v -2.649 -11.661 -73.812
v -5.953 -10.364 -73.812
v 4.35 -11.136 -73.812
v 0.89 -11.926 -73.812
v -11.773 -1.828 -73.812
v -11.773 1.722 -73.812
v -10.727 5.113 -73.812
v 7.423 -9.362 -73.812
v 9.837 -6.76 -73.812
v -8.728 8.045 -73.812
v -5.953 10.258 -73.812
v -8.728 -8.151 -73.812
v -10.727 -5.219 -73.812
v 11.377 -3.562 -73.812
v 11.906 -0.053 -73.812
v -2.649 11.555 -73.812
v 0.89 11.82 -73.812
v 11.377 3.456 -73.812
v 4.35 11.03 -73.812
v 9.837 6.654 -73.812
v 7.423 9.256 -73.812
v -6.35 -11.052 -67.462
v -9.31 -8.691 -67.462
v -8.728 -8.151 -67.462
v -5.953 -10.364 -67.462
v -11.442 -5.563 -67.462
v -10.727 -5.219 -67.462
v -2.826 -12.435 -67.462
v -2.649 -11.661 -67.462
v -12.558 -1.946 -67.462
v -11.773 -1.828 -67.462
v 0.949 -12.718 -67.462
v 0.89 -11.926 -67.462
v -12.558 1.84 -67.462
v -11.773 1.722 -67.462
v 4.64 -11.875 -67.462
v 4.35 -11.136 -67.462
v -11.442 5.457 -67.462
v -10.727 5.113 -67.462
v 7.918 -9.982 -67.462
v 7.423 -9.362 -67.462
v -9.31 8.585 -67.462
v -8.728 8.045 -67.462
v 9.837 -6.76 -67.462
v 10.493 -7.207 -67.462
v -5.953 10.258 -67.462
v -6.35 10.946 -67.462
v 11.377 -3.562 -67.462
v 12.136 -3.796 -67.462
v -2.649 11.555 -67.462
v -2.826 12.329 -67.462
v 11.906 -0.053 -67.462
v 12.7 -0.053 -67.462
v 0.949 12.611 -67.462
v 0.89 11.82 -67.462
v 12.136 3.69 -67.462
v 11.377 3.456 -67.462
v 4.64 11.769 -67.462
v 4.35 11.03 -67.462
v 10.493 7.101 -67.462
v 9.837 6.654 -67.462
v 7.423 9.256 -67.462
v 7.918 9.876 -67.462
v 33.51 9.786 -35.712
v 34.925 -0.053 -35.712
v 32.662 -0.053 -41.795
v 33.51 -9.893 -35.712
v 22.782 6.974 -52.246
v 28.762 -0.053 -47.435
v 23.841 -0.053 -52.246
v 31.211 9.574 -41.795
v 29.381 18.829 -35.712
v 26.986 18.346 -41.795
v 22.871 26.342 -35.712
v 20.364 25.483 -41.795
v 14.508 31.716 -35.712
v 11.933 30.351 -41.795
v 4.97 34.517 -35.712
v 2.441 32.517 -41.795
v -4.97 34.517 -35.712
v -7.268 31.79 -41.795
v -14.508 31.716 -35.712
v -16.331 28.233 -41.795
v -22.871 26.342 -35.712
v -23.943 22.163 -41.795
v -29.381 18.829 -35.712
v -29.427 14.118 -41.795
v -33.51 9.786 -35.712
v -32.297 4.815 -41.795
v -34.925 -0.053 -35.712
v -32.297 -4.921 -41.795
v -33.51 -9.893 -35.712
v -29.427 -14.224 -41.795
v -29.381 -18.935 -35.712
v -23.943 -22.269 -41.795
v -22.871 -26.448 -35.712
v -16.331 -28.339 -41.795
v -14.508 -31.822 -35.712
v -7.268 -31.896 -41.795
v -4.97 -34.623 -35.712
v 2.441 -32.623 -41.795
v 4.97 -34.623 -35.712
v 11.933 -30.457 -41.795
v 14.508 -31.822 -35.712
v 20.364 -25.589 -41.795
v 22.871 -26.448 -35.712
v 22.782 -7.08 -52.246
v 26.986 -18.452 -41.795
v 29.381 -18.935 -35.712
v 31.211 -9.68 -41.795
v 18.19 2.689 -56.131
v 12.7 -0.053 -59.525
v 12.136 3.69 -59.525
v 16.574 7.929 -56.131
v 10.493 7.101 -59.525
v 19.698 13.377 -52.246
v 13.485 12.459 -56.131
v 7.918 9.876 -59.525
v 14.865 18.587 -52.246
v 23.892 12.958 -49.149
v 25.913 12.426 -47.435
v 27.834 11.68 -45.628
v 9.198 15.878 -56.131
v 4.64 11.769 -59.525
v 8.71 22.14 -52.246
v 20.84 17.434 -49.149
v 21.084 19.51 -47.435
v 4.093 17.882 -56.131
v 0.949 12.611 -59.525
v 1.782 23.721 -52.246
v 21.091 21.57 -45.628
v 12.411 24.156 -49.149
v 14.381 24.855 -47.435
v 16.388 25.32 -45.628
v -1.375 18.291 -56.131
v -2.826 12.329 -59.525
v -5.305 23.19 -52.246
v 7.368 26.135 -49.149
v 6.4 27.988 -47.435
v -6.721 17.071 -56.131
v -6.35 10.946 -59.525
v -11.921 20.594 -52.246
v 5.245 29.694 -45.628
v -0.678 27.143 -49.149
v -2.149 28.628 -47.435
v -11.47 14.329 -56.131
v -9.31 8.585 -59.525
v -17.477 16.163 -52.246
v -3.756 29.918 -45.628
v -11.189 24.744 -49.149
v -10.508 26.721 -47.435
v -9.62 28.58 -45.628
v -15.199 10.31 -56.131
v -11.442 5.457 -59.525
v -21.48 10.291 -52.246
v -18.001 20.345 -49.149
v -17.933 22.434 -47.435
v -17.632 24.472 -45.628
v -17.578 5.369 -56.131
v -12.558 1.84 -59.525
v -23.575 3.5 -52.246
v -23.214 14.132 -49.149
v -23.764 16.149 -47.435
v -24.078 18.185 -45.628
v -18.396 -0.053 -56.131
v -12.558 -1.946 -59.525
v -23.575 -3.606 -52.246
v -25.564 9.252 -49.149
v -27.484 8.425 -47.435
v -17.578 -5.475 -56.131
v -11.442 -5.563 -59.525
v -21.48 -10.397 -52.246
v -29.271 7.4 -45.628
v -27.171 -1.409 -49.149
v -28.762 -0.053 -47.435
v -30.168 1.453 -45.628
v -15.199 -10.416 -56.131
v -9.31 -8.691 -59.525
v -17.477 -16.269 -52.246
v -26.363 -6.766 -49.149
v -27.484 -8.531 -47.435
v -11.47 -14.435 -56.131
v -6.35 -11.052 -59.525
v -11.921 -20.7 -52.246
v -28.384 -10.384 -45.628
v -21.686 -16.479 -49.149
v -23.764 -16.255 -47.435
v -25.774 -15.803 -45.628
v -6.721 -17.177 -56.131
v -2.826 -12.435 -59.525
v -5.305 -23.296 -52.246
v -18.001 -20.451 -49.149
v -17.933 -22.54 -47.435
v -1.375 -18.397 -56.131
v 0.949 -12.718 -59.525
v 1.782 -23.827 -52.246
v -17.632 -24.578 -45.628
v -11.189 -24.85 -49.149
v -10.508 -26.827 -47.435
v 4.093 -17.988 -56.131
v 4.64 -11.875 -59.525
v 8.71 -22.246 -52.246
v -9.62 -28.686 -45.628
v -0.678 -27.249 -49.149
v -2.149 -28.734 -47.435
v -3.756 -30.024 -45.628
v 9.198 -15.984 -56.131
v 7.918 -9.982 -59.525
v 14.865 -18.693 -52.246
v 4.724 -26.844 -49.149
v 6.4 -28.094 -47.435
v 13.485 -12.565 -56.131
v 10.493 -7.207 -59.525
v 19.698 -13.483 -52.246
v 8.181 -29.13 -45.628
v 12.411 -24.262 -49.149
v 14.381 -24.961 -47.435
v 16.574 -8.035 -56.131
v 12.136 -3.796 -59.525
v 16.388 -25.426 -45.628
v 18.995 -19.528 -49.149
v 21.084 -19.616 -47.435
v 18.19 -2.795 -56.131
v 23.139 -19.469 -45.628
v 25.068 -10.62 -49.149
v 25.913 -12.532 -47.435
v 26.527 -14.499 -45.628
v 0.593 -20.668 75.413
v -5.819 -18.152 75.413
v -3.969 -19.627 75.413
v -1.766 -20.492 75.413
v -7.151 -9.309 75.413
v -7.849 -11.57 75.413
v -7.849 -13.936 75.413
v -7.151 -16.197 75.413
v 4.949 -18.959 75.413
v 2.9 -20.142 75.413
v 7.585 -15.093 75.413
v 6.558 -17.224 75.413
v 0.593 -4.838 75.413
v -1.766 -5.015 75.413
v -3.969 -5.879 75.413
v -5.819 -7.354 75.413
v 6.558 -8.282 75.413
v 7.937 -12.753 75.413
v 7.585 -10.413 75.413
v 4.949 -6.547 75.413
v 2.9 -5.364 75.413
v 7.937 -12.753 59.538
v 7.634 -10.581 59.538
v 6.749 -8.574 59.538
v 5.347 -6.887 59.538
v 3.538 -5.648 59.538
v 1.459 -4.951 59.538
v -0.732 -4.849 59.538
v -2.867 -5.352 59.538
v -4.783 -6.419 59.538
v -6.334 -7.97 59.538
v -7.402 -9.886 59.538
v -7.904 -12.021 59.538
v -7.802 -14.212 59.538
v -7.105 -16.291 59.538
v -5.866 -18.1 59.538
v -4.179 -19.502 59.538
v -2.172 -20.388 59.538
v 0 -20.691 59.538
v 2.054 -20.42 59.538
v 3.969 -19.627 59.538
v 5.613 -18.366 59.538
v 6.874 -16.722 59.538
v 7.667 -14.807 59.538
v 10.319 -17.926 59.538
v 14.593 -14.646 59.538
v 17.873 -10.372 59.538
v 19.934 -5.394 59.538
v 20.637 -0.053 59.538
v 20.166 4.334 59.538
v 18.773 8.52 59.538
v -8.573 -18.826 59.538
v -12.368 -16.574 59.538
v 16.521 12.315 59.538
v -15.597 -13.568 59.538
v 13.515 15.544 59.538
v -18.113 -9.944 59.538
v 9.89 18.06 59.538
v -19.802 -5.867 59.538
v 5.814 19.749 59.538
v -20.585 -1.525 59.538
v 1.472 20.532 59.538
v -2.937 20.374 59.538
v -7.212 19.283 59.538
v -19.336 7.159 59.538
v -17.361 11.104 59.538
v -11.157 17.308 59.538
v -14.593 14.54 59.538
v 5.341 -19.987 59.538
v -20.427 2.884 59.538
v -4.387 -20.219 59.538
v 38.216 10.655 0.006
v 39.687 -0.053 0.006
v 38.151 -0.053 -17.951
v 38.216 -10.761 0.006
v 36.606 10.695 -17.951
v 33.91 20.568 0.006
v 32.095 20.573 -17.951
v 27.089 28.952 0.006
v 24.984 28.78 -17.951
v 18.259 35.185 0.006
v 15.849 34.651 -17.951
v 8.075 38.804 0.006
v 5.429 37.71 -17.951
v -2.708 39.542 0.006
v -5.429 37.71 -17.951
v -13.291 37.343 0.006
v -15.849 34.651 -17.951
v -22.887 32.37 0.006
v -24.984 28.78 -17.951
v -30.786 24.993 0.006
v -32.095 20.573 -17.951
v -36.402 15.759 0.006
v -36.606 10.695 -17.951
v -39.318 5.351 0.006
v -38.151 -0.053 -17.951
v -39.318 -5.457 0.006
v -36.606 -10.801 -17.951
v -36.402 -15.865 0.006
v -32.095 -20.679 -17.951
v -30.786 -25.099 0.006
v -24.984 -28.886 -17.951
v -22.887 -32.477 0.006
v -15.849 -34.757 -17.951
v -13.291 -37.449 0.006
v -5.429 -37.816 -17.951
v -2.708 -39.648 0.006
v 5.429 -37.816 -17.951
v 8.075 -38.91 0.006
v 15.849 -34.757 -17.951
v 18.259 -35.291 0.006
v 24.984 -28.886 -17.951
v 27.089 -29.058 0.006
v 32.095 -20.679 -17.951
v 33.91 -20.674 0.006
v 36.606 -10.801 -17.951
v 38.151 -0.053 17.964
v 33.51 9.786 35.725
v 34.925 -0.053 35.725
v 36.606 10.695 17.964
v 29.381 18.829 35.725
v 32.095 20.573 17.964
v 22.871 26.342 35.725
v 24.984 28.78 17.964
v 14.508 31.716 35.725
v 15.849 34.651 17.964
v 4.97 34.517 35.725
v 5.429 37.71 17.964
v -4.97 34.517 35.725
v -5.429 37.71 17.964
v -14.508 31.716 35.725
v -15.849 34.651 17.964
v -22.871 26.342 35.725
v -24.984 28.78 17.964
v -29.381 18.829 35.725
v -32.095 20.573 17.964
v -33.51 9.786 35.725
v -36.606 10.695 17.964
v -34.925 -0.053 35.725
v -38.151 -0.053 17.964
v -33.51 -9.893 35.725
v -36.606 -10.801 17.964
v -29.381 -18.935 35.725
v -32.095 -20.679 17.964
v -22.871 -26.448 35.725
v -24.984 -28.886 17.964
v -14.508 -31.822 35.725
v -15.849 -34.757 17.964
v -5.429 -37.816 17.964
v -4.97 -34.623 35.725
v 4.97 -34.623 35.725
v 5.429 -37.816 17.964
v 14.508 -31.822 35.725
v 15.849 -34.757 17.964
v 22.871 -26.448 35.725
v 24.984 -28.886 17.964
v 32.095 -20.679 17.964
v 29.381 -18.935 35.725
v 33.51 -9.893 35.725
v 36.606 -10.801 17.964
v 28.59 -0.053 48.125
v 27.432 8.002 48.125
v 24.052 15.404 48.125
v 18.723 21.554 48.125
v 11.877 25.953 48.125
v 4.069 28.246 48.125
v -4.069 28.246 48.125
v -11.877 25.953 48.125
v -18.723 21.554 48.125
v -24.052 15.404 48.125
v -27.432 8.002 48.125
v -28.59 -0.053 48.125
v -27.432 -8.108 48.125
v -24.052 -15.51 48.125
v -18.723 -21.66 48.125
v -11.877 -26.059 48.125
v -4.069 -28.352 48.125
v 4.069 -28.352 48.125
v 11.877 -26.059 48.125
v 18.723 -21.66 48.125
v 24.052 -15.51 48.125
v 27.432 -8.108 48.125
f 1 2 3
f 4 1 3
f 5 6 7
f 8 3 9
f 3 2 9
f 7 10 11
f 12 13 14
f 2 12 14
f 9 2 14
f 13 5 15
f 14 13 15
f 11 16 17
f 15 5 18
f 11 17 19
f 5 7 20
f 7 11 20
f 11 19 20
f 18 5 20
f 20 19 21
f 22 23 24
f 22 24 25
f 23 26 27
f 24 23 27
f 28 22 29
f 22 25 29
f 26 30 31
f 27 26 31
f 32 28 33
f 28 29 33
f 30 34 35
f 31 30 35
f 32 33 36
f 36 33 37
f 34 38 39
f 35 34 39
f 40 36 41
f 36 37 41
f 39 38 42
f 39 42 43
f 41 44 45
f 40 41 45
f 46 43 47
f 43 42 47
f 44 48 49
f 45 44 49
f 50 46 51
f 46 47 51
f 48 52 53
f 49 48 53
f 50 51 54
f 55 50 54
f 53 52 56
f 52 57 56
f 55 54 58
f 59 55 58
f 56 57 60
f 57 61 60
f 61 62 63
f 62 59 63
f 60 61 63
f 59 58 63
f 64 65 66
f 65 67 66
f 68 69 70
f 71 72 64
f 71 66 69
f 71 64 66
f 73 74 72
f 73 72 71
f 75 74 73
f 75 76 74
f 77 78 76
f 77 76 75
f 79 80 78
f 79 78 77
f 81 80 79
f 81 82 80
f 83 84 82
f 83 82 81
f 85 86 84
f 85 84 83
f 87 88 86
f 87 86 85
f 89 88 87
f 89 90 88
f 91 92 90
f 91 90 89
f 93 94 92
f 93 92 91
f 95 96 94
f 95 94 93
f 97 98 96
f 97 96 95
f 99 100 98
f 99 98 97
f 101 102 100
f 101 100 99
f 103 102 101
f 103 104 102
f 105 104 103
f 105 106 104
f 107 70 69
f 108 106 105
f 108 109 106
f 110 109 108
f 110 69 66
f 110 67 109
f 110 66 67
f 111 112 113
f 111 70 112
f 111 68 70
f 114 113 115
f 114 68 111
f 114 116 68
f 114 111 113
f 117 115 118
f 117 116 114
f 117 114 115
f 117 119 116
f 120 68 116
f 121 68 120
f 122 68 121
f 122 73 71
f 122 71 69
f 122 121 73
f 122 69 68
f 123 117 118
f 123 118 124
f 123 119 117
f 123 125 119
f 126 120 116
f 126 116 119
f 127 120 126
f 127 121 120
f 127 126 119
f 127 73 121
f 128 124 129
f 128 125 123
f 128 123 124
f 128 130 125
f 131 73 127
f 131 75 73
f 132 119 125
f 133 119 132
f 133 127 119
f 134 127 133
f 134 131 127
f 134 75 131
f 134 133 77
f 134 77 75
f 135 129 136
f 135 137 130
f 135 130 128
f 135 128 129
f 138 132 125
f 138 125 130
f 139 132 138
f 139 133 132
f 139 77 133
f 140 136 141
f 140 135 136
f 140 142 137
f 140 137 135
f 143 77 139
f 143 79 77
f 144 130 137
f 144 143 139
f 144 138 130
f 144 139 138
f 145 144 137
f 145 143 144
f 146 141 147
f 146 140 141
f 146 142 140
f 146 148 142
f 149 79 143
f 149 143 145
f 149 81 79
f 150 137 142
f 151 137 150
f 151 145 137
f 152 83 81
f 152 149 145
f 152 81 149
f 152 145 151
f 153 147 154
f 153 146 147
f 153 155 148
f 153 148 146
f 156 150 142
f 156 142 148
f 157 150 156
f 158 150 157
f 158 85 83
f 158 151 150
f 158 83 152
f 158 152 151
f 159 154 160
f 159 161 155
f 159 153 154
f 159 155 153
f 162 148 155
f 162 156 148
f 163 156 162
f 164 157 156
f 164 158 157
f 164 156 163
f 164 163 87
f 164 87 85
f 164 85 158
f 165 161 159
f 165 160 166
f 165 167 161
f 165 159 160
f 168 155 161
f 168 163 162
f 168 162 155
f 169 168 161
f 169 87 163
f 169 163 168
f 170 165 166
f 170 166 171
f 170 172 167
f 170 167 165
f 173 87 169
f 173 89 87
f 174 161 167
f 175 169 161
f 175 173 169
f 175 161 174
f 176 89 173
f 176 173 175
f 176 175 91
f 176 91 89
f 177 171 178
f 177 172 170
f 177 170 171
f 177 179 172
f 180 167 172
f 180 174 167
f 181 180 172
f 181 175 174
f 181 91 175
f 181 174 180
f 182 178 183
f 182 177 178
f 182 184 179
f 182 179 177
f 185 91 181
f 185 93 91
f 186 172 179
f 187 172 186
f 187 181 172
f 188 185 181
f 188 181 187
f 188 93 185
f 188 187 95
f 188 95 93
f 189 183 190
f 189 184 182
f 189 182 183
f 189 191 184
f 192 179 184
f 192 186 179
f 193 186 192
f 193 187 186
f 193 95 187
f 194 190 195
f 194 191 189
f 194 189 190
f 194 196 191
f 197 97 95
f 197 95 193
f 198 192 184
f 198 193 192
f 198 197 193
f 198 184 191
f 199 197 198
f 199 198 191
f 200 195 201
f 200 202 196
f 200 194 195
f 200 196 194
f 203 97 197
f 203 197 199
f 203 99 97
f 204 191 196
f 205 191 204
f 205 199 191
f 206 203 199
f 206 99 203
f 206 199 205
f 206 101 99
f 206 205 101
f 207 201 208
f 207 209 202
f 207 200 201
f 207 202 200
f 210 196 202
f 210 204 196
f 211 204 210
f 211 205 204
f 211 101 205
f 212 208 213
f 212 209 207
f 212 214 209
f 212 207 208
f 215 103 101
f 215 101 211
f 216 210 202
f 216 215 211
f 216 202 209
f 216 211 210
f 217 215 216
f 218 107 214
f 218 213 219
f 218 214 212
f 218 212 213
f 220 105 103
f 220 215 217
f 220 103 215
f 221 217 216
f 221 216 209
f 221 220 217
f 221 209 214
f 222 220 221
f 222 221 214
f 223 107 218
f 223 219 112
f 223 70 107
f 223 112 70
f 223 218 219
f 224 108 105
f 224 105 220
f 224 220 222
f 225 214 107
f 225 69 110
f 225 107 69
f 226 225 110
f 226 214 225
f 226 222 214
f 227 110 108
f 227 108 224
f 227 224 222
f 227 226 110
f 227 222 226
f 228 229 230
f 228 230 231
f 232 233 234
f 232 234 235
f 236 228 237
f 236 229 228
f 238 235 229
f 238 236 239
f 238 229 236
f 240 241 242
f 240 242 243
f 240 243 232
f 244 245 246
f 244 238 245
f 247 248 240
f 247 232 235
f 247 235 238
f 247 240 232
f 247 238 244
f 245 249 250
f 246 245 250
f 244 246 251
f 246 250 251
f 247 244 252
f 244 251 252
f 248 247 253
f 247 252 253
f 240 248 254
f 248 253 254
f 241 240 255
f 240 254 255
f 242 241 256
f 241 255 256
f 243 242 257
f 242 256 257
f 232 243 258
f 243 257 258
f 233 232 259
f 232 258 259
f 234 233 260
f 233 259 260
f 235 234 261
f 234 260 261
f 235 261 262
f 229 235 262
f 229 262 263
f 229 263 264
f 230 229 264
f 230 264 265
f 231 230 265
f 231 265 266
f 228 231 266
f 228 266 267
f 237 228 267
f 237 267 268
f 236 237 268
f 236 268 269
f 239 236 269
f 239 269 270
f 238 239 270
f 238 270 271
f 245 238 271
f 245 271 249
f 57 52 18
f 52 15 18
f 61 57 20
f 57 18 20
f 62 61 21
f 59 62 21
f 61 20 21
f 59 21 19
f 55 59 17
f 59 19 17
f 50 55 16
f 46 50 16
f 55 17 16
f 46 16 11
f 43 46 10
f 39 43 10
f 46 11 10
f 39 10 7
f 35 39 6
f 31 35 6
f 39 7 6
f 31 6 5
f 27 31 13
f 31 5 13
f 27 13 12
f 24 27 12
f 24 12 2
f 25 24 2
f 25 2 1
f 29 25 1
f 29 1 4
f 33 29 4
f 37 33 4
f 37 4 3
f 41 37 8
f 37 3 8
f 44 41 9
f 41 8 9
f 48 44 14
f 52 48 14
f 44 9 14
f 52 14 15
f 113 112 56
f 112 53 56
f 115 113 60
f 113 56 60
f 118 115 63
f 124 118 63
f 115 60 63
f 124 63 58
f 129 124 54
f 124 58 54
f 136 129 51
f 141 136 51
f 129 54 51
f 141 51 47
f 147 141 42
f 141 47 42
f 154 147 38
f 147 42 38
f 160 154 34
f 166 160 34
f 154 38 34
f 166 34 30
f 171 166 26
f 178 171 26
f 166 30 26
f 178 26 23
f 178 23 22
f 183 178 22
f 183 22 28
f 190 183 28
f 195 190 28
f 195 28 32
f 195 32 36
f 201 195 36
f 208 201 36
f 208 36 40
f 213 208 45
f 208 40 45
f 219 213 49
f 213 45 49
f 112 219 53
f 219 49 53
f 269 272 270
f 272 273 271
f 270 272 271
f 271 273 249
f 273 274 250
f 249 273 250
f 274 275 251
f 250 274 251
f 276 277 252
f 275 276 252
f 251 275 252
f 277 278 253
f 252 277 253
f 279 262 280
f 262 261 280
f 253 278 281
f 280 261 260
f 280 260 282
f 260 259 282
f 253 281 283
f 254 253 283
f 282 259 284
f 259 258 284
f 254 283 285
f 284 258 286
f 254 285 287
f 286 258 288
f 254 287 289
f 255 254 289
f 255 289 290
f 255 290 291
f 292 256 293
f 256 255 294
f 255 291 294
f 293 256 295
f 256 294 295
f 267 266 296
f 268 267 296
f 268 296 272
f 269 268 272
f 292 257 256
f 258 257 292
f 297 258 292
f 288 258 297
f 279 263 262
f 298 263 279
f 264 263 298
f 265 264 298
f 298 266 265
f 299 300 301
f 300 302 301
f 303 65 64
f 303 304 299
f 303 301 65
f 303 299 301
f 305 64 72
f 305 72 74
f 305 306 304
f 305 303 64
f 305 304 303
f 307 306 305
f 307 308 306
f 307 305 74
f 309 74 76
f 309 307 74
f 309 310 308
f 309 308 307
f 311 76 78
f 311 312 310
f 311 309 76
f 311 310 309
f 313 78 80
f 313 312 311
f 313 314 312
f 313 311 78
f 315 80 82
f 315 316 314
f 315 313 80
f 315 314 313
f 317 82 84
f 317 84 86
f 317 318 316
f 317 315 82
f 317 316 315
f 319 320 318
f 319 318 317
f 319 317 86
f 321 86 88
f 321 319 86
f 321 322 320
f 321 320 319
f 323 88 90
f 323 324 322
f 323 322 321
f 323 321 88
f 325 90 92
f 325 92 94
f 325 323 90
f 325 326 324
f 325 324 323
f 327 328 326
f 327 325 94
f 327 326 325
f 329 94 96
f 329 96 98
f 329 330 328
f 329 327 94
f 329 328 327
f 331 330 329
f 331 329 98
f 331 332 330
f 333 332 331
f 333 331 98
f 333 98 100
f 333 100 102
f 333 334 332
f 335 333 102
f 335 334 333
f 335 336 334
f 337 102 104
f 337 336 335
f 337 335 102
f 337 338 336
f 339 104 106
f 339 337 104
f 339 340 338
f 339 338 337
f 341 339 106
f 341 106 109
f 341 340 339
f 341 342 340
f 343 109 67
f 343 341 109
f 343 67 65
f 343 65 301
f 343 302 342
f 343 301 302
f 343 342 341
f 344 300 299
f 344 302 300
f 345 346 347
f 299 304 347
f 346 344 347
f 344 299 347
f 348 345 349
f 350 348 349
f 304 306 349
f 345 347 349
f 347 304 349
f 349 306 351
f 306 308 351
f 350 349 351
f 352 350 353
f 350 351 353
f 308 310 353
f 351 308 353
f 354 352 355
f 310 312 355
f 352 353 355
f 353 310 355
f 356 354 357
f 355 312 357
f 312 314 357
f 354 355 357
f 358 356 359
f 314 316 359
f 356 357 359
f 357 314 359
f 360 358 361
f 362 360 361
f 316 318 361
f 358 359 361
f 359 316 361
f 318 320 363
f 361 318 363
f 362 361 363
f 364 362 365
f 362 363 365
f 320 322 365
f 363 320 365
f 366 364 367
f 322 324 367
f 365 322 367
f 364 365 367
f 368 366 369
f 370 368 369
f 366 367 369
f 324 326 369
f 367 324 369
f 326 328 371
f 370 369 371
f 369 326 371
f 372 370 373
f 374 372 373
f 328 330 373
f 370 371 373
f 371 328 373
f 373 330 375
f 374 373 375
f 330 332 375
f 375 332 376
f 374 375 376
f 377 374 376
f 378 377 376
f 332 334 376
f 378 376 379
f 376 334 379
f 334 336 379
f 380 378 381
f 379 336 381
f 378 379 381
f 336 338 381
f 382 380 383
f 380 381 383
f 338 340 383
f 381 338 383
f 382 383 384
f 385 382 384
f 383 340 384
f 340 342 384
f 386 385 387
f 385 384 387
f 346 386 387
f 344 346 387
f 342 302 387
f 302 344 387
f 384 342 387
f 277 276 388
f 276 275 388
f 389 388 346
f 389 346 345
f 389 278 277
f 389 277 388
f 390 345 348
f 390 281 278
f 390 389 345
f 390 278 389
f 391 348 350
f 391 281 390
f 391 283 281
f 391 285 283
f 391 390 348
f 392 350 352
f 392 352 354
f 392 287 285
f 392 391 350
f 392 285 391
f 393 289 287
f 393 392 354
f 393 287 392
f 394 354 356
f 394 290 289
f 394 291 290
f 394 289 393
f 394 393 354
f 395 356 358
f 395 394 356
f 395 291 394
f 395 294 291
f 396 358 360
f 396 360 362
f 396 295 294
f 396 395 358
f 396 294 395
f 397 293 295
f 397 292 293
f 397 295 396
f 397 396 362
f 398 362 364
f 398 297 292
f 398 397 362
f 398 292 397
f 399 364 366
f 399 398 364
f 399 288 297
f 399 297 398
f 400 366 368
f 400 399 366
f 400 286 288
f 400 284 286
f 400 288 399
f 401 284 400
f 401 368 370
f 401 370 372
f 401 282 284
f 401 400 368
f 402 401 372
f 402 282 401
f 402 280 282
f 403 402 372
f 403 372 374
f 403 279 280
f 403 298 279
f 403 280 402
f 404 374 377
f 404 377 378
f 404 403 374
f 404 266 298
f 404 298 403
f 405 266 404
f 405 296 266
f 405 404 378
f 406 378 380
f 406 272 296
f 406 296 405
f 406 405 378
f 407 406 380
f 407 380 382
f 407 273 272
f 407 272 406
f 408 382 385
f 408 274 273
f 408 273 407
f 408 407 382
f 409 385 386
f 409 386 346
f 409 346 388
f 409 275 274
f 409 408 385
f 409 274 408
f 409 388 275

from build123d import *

# Parameters (mm, degrees)
SKETCH4_R            = 12.7
BAG_ATTACHMENT_DEPTH = 25.4
SCALE1_SCALE         = 0.625


with BuildPart() as part:
    # Sketch1 → body (revolve)
    with BuildSketch(Plane(origin=(0, 0, 0), x_dir=(1, 0, 0), z_dir=(0, 1, 0))):
        with BuildLine():
            Line((0, 95.25), (0, -95.25))
            Line((0, -95.25), (33.02, -95.25))
            add(Edge.make_bspline(
                [(55.88, -57.15), (52.333253403, -64.649759535), (45.965562244, -78.114536673), (36.994334659, -89.98935048), (33.02, -95.25)],
                knots=[0, 0, 0, 0, 0.556990989, 1, 1, 1, 1], degree=3))
            add(Edge.make_bspline(
                [(55.88, -57.15), (58.418345497, -44.49907482), (62.211374207, -25.594901819), (63.179693062, -6.361990172), (63.5, 0)],
                knots=[0, 0, 0, 0, 0.669213363, 1, 1, 1, 1], degree=3))
            add(Edge.make_bspline(
                [(55.88, 57.15), (58.418345497, 44.49907482), (62.211374207, 25.594901819), (63.179693062, 6.361990172), (63.5, 0)],
                knots=[0, 0, 0, 0, 0.669213363, 1, 1, 1, 1], degree=3))
            add(Edge.make_bspline(
                [(20.32, 95.25), (27.263983104, 91.241807371), (42.563906598, 82.410414831), (54.075514966, 66.14341921), (55.88, 57.15)],
                knots=[0, 0, 0, 0, 0.453857374, 1, 1, 1, 1], degree=3))
            Line((20.32, 95.25), (20.32, 107.95))
            Line((20.32, 107.95), (19.05, 107.95))
            Line((19.05, 107.95), (19.05, 118.11))
            Line((19.05, 118.11), (0, 118.11))
            Line((0, 118.11), (0, 107.95))
            Line((0, 107.95), (0, 95.25))
        make_face()
    revolve(axis=Axis((0, 0, -95.25), (0, 0, 1)))

    # Sketch4 → bag_attachment (add)
    with BuildSketch(Plane.XY.offset(95.25)):
        with Locations((0, -20.32)):
            Circle(SKETCH4_R)
    extrude(amount=BAG_ATTACHMENT_DEPTH)


with BuildPart() as part_1:
    # Scale1: scaled about (-8.591e-06, -0.141365899, 0.01703512)
    add(part.part.scale(SCALE1_SCALE).moved(Location((-3.222e-06, -0.053012212, 0.00638817))))


solid = part_1.part
